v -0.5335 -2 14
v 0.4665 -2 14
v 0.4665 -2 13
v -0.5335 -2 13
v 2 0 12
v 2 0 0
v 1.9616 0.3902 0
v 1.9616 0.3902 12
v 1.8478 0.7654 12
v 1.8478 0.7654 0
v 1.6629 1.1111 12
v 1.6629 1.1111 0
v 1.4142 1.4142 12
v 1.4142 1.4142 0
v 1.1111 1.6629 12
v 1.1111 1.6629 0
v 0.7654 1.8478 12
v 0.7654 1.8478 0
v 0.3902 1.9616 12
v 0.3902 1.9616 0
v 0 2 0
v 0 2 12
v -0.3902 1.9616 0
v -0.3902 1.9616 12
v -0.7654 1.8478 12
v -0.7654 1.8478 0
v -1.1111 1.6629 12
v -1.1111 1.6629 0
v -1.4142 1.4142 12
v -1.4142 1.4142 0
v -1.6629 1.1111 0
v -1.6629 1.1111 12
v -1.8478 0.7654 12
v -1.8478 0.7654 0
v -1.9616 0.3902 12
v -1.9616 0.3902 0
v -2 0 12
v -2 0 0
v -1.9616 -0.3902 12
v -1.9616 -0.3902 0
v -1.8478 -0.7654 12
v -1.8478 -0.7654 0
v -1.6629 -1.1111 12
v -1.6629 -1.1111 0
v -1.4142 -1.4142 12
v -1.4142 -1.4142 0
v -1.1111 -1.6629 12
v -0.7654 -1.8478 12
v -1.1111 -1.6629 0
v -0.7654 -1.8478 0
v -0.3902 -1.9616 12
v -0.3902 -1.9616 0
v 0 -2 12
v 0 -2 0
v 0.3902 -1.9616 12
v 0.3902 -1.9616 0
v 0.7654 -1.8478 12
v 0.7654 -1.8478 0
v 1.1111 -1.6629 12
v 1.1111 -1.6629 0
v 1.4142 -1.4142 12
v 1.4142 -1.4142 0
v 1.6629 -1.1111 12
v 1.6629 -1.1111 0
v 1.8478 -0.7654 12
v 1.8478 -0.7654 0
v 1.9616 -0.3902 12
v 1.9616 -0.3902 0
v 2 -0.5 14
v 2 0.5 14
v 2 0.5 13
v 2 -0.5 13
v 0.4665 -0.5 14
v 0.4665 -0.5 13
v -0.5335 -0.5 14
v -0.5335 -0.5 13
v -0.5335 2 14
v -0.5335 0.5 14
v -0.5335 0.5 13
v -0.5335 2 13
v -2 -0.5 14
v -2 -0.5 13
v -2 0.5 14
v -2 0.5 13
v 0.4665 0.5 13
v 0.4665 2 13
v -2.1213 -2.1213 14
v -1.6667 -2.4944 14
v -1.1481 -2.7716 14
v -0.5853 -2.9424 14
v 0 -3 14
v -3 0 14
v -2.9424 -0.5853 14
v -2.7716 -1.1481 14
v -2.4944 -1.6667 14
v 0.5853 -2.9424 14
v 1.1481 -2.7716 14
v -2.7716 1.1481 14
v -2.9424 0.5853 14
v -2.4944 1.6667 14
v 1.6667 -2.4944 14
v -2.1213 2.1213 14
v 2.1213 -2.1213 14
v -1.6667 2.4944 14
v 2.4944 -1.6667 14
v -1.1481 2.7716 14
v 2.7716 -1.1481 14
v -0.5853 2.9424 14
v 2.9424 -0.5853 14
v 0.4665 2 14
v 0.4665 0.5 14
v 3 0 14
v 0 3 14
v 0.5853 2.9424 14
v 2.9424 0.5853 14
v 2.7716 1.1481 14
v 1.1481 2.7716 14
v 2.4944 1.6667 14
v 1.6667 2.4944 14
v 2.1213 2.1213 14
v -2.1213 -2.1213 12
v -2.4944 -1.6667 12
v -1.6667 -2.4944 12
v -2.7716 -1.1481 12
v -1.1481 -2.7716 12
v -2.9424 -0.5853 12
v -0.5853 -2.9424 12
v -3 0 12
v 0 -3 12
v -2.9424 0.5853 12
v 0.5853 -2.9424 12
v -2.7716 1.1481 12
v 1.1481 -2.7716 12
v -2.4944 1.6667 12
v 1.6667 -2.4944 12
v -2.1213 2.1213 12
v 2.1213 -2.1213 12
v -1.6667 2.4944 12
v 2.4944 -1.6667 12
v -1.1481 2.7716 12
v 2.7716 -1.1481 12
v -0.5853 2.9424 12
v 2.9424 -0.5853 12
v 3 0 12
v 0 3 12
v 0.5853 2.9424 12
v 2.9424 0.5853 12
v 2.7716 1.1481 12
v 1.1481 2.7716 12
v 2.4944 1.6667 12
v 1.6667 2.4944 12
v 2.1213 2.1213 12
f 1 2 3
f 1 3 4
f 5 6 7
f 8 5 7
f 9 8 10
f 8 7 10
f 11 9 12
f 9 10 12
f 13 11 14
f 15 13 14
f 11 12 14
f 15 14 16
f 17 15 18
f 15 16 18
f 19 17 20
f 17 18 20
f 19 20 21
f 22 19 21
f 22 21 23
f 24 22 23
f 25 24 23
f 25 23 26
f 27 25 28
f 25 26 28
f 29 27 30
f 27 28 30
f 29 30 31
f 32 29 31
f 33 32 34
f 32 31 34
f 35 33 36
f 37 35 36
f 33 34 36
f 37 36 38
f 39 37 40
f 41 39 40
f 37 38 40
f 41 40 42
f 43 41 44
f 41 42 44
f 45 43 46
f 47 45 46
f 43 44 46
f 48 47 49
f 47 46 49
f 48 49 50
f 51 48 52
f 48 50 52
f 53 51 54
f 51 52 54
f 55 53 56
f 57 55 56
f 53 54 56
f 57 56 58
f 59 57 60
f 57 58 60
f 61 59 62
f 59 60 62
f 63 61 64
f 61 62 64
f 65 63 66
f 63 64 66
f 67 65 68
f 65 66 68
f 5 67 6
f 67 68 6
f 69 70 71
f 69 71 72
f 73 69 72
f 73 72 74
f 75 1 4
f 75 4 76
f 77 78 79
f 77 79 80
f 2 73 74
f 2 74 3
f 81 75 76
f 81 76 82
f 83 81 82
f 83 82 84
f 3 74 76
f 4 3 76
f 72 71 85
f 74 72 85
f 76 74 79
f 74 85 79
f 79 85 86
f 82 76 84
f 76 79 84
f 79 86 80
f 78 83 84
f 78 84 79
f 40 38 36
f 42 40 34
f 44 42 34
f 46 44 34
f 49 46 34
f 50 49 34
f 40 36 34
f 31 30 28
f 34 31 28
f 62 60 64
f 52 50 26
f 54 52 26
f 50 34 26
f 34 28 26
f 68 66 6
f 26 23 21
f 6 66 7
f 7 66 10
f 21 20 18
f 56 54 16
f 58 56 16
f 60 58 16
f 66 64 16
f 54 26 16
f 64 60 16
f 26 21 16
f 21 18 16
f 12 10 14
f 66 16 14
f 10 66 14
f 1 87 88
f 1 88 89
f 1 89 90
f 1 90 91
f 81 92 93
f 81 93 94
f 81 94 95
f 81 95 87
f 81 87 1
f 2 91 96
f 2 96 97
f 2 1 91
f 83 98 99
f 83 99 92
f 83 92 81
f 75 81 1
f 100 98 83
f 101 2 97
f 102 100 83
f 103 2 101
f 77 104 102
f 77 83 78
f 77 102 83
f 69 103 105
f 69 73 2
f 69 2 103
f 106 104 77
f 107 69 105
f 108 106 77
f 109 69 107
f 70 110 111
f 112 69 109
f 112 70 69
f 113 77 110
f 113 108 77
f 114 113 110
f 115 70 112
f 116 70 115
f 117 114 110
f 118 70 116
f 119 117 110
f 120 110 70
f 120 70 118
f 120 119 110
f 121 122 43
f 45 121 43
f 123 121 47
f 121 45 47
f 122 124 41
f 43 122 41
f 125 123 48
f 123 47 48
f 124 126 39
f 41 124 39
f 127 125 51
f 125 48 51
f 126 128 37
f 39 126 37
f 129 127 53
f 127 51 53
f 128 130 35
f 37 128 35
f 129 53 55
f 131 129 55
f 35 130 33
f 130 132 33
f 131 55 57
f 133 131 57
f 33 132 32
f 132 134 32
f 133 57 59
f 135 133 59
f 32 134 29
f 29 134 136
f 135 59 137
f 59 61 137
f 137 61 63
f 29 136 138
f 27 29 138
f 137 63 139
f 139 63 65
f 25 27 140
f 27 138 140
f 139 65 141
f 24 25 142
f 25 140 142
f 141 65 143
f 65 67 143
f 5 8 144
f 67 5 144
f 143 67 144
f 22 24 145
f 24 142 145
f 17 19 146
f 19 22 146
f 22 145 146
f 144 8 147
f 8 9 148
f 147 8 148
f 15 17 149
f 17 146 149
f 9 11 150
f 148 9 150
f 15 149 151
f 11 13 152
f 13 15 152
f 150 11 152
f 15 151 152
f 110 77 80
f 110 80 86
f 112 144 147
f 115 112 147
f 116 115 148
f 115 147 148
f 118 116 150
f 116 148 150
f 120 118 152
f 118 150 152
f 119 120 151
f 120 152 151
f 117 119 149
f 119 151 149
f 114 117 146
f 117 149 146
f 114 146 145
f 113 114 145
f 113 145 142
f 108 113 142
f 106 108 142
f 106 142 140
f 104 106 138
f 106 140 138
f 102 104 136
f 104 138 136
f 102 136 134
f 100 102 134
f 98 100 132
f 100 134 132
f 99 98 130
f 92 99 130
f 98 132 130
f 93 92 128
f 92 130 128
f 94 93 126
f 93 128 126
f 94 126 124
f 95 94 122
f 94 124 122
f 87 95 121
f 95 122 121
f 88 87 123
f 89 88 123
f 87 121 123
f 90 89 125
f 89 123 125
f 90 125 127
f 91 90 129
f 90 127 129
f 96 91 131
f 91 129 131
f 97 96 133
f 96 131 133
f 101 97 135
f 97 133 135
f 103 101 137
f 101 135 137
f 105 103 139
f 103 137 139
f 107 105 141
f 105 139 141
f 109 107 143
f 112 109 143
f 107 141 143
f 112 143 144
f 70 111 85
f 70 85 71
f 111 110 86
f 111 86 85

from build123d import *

# Parameters (mm, degrees)
SZKIC1_R                    = 2
DODANIE_WYCI_GNI_CIE1_DEPTH = 12
SZKIC2_R                    = 3
DODANIE_WYCI_GNI_CIE2_DEPTH = 2
WYTNIJ_WYCI_GNI_CIE1_DEPTH  = 1


with BuildPart() as part:
    # Szkic1 → Dodanie-wyciągnięcie1 (new body)
    with BuildSketch(Plane.XY):
        Circle(SZKIC1_R)
    extrude(amount=DODANIE_WYCI_GNI_CIE1_DEPTH)

    # Szkic2 → Dodanie-wyciągnięcie2 (add)
    with BuildSketch(Plane.XY.offset(12)):
        Circle(SZKIC2_R)
    extrude(amount=DODANIE_WYCI_GNI_CIE2_DEPTH)

    # Szkic3 → Wytnij-wyciągnięcie1 (cut)
    with BuildSketch(Plane.XY.offset(14)):
        Polygon((0.466528249, 0.5), (2, 0.5), (2, -0.5), (0.466528249, -0.5), (0.466528249, -2), (-0.533471751, -2), (-0.533471751, -0.5), (-2, -0.5), (-2, 0.5), (-0.533471751, 0.5), (-0.533471751, 2), (0.466528249, 2), align=None)
    extrude(amount=-WYTNIJ_WYCI_GNI_CIE1_DEPTH, mode=Mode.SUBTRACT)


solid = part.part
